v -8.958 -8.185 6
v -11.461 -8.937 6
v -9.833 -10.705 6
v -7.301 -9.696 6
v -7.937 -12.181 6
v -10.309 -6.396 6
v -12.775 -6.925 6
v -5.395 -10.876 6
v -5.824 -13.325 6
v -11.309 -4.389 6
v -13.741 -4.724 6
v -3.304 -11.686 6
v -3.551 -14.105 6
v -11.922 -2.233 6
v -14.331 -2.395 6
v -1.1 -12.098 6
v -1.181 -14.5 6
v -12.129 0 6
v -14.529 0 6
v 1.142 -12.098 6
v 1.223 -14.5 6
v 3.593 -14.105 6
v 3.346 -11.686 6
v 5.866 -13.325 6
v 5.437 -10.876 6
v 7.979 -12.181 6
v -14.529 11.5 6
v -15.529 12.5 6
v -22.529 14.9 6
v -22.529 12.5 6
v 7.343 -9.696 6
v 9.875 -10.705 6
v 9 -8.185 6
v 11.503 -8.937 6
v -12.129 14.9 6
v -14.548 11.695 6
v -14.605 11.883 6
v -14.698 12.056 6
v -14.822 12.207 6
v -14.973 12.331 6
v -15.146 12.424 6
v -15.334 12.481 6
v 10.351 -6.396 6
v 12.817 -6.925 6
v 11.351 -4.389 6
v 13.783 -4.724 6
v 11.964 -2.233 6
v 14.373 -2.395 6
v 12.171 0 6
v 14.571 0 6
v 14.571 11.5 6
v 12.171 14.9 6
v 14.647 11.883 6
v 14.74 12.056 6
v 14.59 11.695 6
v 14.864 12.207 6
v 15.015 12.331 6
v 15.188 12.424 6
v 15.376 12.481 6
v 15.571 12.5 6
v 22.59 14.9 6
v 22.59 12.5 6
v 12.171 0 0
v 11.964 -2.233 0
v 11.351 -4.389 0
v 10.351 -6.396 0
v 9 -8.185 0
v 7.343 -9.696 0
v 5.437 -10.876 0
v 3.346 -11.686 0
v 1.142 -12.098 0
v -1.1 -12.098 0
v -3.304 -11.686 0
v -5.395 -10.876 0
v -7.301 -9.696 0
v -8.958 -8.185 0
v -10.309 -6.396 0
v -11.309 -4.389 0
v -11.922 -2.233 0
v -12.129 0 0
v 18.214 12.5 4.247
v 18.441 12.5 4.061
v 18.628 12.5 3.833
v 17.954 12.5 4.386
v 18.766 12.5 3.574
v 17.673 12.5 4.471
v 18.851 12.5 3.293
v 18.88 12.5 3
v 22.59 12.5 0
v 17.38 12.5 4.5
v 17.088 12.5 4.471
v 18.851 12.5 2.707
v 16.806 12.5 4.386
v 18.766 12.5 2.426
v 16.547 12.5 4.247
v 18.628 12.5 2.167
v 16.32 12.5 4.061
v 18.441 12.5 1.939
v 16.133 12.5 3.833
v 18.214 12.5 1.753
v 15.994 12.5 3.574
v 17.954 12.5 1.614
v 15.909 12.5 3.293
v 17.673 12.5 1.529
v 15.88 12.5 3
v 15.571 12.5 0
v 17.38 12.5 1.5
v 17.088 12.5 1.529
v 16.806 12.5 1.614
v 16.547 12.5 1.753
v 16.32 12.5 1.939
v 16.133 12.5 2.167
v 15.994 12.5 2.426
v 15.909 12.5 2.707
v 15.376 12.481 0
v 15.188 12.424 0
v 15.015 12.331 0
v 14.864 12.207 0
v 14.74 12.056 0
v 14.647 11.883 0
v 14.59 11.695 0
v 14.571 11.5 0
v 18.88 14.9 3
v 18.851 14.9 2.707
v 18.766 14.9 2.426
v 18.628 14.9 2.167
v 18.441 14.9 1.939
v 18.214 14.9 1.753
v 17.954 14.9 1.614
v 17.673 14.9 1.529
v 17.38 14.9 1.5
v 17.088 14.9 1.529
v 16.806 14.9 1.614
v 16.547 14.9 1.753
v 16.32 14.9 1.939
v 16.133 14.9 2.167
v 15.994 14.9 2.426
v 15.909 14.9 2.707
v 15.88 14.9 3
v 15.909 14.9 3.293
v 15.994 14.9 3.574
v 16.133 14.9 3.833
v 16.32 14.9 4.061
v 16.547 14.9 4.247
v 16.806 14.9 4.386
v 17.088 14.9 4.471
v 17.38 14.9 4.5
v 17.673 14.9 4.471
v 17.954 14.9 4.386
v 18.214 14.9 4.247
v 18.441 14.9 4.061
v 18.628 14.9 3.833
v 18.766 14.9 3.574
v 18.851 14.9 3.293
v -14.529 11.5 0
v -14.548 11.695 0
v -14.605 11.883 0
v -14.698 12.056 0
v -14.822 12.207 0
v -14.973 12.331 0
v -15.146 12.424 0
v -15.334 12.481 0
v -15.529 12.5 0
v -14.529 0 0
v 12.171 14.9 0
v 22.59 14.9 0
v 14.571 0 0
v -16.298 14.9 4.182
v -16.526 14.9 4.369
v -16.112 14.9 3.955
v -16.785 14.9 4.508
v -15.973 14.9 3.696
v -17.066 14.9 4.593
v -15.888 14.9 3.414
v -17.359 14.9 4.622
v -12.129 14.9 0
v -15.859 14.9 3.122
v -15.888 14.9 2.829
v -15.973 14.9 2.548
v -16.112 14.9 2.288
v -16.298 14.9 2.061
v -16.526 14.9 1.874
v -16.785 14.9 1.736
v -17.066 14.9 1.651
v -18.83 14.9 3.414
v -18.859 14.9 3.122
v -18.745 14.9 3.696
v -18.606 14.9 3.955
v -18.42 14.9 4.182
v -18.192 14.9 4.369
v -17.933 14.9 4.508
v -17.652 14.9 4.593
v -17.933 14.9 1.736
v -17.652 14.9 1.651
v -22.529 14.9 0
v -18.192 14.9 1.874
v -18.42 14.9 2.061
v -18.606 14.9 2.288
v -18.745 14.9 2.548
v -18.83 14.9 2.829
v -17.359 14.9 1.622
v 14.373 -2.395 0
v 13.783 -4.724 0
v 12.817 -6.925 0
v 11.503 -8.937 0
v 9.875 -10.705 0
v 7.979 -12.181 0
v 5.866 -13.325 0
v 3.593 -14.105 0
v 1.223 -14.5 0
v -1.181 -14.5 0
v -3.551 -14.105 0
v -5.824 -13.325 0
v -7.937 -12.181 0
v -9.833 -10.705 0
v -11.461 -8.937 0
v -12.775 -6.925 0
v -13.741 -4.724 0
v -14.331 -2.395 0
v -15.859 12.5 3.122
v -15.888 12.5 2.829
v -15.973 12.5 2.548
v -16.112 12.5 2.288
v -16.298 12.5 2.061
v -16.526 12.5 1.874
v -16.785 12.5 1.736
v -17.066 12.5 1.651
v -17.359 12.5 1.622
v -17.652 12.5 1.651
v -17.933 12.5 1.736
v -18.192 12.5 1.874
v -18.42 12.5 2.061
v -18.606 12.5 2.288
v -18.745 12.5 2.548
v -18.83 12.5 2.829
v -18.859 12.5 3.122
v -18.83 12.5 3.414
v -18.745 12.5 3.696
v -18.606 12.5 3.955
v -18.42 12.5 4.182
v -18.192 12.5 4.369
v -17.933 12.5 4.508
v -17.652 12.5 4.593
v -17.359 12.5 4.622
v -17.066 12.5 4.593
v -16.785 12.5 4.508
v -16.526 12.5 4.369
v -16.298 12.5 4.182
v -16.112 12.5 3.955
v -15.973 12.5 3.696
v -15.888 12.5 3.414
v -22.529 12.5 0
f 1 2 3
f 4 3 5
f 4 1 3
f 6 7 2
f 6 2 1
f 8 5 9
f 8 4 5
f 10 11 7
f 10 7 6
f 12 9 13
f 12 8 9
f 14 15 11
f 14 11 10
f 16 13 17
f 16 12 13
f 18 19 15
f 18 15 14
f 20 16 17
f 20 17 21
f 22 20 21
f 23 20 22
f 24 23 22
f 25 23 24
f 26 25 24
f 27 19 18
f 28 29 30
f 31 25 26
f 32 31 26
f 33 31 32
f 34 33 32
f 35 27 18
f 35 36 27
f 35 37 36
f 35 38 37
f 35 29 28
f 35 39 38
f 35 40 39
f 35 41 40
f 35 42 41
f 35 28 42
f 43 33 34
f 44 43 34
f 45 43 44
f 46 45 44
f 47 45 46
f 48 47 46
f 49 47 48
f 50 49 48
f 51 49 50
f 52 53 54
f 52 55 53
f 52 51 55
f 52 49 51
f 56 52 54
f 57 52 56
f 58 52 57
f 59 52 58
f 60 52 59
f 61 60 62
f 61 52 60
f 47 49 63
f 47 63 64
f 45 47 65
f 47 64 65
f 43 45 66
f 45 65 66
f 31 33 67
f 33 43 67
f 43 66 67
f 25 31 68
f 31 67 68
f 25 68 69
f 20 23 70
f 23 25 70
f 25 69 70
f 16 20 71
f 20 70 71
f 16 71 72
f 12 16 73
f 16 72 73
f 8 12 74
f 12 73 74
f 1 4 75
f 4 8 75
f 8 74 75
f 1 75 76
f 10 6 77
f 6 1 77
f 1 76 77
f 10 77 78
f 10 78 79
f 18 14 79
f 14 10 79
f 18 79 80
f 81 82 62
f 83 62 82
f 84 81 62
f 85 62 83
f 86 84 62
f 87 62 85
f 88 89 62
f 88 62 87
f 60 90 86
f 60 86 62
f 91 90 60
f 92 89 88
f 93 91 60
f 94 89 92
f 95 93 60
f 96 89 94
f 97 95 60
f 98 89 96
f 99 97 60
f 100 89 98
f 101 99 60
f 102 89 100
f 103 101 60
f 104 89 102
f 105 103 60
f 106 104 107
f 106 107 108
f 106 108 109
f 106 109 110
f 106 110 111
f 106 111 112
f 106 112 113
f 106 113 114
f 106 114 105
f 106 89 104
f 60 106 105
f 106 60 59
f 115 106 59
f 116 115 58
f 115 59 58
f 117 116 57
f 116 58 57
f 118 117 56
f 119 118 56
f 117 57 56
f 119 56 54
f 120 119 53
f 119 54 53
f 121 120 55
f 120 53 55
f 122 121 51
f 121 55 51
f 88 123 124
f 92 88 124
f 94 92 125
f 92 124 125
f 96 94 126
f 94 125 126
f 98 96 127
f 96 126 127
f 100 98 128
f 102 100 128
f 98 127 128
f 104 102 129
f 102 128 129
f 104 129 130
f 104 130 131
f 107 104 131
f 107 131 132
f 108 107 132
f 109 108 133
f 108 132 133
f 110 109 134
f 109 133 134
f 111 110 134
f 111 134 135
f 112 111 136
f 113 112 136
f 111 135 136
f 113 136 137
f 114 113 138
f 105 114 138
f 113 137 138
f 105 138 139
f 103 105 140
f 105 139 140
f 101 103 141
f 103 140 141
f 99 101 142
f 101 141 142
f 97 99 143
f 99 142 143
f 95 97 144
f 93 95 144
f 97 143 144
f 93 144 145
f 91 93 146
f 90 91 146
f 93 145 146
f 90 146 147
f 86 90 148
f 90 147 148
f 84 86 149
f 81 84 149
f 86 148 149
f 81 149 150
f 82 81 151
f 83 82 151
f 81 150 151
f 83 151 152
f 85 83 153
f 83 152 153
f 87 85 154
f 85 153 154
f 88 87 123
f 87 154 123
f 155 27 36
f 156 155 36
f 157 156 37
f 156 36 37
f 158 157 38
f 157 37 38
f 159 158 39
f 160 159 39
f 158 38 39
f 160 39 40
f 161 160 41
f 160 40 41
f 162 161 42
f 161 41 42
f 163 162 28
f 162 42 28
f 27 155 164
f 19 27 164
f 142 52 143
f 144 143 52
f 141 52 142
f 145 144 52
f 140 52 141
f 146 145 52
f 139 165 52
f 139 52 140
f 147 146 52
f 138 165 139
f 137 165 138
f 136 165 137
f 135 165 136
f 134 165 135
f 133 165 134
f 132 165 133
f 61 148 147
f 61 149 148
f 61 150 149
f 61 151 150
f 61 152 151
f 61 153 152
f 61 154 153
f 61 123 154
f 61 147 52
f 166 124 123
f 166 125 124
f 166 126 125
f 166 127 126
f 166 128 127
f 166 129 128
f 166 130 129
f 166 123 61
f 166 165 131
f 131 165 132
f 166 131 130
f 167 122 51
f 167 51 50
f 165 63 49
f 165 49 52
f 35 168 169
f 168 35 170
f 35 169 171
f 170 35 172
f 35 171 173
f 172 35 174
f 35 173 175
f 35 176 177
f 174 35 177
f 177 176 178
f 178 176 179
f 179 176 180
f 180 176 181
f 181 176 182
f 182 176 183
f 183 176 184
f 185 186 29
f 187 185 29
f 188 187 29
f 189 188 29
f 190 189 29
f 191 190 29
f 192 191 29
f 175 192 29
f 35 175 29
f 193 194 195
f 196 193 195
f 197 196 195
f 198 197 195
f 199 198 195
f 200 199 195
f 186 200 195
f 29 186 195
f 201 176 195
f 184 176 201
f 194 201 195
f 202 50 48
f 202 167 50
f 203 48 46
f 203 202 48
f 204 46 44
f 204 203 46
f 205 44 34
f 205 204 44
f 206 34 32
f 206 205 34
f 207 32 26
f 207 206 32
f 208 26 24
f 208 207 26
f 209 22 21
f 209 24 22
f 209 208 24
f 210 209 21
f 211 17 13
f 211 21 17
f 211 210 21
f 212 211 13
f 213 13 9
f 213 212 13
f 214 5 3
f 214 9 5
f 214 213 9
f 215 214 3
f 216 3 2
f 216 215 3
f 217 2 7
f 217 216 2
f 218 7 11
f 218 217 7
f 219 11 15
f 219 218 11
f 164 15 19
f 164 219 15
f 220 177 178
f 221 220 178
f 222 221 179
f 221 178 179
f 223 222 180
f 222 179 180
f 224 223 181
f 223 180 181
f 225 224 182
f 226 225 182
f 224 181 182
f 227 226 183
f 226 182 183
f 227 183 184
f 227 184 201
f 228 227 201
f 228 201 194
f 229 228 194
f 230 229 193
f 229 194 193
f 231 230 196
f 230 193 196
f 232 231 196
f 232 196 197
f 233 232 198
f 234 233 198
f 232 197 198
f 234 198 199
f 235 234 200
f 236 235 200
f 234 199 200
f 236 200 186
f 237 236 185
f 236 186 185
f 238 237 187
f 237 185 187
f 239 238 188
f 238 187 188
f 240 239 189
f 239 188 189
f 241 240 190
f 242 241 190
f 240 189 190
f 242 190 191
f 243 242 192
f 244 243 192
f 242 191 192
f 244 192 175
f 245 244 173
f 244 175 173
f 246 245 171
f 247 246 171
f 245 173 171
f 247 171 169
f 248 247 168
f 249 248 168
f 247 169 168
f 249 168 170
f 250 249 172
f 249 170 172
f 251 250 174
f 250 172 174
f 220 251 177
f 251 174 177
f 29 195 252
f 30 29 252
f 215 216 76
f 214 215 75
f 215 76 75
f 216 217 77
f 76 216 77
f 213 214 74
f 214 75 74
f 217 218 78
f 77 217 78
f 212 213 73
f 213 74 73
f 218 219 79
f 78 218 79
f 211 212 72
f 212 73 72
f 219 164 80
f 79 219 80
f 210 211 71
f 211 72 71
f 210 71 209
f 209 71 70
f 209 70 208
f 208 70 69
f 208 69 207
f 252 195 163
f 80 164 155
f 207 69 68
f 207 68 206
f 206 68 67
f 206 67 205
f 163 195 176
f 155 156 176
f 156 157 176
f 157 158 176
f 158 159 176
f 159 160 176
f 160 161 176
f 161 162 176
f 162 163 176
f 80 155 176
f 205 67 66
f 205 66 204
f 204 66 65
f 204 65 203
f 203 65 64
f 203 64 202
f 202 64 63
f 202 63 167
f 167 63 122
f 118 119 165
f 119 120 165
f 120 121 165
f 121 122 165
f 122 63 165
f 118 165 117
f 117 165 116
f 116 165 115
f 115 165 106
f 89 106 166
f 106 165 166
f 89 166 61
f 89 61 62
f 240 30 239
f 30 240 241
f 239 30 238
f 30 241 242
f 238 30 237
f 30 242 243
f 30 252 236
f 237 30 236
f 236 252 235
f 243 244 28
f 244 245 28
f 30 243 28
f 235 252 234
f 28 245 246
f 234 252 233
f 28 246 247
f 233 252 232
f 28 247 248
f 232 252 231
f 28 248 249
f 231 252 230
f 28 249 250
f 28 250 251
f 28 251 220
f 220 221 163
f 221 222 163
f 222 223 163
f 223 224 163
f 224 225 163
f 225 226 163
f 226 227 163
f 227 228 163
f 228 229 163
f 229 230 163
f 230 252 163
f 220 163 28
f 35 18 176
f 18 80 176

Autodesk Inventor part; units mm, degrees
ref_plane "YZ Plane" through (0, 0, 0) normal (1, 0, 0) x (0, 1, 0)
ref_plane "XZ Plane" through (0, 0, 0) normal (0, 1, 0) x (-1, 0, 0)
ref_plane "XY Plane" through (0, 0, 0) normal (0, 0, 1) x (1, 0, 0)
sketch "Sketch1" plane through (0, 0, 0) normal (0, 0, 1) x (1, 0, 0)
  line L0 (-22.529, 12.5) -> (-14.529, 12.5)
  line L1 (22.5896, 12.5) -> (14.571, 12.5)
  line L2 (12.171, 14.9) -> (22.5896, 14.9)
  line L3 (22.5896, 14.9) -> (22.5896, 12.5)
  line L4 (-12.129, 14.9) -> (-22.529, 14.9)
  line L5 (-22.529, 14.9) -> (-22.529, 12.5)
  line L6 (-12.129, 0) -> (-12.129, 14.9)
  line L7 (12.171, 0) -> (12.171, 14.9)
  arc A0 (-12.129, 0) -> (12.171, 0) centre (0.021, 0) ccw
  arc A1 (-14.529, 0) -> (14.571, 0) centre (0.021, 0) ccw
  line L8 (-14.529, 12.5) -> (-14.529, -0.0004)
  line L9 (14.571, 12.5) -> (14.571, 0)
  point P0 (0, 0)
  point P1 (14.6524, 0.7379)
  dimension "d34" = 14.9
  dimension "d35" = 14.9
  dimension "d38" = 2.4
  dimension "d39" = 2.4
  dimension "d46" = 24.3
  dimension "d47" = 2.4
  dimension "d48" = 2.4
extrude "Extrusion5" add sketch "Sketch1" along normal blind 6
fillet "Fillet7" radius 1 1 edges at (14.571, 12.5, 3)
fillet "Fillet8" radius 1 1 edges at (-14.529, 12.5, 3)
sketch "Sketch5" plane through (12.171, 14.9, 0) normal (0, 1, 0) x (1, 0, 0)
  line L0 (10.4185, 0) -> (10.4185, -6)
  line L1 (3.4, 0) -> (10.4185, 0) projected
  circle A0 centre (5.2093, -3) radius 1.5
  circle A1 centre (-29.5299, -3.1217) radius 1.5
  point P0 (-12.171, 0)
  dimension "d54" = 3
extrude "Extrusion6" cut sketch "Sketch5" against normal blind 10
properties part number "motor_support_v2" material "PET Plastic"
